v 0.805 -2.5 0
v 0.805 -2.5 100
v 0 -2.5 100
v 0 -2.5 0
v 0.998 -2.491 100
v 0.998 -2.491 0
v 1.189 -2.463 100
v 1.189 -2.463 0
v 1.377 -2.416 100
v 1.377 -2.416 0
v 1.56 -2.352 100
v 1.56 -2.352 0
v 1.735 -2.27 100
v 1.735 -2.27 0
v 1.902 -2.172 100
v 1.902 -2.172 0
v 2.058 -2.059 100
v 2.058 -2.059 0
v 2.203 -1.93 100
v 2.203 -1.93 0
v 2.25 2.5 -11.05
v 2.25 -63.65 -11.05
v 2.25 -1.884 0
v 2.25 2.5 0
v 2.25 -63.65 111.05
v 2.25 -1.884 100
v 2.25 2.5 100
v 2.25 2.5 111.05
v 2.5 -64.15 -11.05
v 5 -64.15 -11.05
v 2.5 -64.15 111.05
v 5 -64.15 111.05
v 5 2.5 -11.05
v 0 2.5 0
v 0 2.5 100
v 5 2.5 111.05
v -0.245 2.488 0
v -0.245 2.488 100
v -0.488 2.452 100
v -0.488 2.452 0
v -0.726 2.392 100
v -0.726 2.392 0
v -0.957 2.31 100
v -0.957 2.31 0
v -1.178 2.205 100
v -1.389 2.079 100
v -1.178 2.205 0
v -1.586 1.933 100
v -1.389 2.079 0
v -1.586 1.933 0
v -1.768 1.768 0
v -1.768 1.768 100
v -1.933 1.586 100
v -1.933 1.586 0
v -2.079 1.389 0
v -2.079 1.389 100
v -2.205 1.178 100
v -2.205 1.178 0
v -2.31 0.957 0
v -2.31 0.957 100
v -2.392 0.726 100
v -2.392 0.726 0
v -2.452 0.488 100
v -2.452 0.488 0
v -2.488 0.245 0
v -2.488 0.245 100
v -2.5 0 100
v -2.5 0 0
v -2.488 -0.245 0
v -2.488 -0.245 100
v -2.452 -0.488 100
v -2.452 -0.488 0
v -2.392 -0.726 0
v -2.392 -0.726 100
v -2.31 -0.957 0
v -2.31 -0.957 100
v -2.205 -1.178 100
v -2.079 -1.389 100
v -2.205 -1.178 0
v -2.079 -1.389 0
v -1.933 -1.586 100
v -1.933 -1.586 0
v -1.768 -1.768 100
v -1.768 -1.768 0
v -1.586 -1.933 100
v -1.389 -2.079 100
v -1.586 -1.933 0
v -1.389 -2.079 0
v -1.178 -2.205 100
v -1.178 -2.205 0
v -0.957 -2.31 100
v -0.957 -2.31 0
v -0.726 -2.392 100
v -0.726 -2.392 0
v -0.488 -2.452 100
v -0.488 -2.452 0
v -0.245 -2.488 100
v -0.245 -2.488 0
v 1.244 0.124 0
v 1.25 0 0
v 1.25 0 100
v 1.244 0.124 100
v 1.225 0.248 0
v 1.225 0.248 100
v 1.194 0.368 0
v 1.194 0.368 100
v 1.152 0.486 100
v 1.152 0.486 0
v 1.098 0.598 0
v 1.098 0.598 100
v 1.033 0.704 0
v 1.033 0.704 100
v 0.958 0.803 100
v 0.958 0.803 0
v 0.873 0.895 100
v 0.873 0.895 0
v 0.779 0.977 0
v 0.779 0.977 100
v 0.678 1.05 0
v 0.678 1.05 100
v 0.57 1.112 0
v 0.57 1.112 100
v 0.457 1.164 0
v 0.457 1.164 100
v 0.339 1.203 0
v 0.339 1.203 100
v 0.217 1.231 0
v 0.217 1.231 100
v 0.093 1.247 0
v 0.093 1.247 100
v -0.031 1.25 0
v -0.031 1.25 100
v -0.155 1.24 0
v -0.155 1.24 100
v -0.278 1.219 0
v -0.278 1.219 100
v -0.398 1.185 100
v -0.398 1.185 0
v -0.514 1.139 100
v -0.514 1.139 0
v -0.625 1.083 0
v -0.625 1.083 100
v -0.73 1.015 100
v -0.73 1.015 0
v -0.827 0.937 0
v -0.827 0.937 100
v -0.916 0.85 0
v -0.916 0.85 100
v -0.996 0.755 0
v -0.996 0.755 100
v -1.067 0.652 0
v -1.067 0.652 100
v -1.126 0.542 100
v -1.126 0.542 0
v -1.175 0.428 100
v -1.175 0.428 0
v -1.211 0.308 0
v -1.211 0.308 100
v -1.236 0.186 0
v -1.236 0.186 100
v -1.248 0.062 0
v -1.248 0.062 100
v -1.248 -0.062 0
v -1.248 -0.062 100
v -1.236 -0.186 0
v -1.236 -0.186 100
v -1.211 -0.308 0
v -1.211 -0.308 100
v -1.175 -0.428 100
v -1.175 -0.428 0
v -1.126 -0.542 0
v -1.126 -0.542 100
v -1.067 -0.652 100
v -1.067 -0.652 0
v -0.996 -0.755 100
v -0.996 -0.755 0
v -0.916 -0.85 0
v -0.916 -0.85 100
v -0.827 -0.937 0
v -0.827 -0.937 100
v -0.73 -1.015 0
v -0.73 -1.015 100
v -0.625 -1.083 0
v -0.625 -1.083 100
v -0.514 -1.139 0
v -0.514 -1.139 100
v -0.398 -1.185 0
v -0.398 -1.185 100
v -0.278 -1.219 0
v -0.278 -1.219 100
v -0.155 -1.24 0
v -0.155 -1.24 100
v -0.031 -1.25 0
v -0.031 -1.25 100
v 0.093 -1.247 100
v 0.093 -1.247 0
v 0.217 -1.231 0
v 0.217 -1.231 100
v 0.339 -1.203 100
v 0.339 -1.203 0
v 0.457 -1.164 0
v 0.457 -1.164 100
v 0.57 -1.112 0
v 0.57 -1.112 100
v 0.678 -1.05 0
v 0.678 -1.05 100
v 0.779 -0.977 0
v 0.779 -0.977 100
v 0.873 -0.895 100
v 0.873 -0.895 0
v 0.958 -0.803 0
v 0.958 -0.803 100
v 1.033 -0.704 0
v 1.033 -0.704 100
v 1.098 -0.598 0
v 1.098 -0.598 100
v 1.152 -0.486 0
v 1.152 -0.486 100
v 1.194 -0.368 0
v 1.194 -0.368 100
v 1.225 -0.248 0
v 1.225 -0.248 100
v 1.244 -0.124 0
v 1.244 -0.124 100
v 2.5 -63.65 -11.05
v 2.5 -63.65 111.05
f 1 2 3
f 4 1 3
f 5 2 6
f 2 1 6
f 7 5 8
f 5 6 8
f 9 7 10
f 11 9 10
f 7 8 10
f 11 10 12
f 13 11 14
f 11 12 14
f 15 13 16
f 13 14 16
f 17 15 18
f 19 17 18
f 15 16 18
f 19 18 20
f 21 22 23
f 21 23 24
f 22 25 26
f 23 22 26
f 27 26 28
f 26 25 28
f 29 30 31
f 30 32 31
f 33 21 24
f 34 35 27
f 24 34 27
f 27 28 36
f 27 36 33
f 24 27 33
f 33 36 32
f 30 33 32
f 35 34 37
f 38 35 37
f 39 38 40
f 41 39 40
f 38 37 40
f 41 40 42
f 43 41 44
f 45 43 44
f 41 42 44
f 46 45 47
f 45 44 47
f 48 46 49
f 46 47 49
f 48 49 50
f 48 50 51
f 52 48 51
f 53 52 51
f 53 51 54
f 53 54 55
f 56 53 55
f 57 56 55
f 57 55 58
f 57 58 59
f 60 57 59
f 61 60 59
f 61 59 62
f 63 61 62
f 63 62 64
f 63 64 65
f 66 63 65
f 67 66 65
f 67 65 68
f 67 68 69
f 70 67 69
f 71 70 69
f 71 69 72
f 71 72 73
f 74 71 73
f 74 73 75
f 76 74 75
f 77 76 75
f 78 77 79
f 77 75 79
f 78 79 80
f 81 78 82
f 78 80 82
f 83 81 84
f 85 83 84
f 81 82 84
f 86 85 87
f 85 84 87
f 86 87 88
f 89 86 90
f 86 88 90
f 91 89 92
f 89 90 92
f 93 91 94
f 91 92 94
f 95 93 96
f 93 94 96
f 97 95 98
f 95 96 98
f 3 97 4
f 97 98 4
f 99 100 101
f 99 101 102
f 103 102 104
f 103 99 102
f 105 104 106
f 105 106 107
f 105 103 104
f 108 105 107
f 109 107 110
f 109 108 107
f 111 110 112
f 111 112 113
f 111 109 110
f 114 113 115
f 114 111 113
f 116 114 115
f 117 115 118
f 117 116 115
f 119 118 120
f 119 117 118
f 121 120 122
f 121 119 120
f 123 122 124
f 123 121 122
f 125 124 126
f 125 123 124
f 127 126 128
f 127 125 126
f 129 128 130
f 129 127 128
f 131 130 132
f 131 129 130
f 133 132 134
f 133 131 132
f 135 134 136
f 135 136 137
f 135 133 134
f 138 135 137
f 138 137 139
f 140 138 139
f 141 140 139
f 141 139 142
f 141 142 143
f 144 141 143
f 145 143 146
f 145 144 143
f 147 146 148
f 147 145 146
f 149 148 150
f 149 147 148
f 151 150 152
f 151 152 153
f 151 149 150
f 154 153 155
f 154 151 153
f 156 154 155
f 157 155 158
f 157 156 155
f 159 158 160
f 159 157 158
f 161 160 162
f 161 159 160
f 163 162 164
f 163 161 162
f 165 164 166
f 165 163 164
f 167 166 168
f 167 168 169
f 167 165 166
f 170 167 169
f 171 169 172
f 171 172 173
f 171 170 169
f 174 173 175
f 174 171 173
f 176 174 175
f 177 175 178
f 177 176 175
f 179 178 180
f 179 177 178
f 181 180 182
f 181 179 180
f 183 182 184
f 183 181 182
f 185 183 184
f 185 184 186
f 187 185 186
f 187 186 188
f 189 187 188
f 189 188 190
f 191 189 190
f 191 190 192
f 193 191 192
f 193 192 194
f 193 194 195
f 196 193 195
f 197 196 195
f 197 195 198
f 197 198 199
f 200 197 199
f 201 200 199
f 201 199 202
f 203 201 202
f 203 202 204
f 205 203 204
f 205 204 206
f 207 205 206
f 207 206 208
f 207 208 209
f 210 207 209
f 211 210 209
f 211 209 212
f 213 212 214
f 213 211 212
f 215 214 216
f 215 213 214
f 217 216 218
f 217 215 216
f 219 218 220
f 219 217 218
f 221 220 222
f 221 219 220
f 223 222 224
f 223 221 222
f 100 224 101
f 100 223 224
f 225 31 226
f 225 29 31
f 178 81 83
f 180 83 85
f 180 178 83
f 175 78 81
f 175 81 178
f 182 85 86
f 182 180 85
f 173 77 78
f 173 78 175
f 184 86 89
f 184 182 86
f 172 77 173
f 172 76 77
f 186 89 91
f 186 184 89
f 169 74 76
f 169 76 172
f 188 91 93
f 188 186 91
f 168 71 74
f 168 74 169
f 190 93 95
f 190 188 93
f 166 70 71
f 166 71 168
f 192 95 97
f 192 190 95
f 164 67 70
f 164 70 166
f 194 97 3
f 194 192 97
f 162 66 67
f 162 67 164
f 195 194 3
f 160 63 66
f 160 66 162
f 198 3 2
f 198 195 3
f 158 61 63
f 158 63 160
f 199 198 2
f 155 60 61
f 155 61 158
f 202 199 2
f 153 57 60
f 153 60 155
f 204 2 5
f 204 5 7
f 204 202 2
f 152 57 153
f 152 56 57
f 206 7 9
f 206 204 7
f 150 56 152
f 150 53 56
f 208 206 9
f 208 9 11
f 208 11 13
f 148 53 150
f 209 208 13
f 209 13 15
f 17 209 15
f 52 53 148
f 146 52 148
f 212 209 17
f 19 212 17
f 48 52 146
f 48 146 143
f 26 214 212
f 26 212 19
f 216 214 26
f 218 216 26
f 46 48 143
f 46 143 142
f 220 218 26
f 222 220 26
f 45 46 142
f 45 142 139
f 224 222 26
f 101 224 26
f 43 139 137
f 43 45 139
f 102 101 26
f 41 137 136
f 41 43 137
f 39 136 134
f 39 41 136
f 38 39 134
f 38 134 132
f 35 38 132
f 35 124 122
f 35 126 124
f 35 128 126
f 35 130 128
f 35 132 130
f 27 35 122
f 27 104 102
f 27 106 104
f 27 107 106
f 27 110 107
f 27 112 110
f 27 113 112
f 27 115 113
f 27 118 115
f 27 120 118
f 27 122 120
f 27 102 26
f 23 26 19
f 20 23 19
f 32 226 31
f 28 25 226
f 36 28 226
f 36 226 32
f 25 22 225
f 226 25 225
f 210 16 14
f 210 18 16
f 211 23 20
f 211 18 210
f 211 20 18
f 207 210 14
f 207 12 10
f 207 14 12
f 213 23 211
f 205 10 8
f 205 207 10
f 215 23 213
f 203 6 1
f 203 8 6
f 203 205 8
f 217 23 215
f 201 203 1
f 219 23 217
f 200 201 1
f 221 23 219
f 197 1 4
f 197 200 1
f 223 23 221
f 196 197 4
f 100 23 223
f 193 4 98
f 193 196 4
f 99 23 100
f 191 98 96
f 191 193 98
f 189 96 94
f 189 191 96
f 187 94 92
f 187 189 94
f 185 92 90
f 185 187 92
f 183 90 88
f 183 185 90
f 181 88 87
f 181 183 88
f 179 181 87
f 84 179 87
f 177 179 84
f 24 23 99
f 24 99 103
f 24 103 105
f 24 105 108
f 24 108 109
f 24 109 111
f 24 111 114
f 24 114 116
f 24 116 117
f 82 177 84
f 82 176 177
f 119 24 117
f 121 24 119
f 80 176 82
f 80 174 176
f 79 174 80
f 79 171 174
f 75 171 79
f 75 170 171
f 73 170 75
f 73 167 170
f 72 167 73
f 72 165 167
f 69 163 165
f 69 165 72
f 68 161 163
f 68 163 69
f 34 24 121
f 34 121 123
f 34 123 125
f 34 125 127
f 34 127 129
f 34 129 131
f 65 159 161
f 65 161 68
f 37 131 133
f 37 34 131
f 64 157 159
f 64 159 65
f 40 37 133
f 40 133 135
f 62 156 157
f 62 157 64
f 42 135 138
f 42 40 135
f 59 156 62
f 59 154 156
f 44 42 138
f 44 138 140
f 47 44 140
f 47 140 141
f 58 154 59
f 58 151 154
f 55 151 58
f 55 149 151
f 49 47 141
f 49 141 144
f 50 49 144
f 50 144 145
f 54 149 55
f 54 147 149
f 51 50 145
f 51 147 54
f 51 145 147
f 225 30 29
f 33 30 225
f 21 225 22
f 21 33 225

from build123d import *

# Parameters (mm, degrees)
SCHIZZO4_R                   = 2.5
SCHIZZO4_R_2                 = 1.25
ESTRUSIONE_ESTRUSIONE3_DEPTH = 100
ESTRUSIONE_ESTRUSIONE4_DEPTH = 61.05
SCHIZZO6_W                   = 8.237008172
SCHIZZO6_H                   = 5.970383375
TAGLIO_ESTRUSIONE2_DEPTH     = 119.1
SCHIZZO7_W                   = 6.014694103
SCHIZZO7_H                   = 5.674261039
TAGLIO_ESTRUSIONE3_DEPTH     = 119.1
ESTRUSIONE_ESTRUSIONE5_REACH = 140.017
SCHIZZO8_W                   = 2.75
SCHIZZO8_H                   = 66.15
TAGLIO_ESTRUSIONE4_DEPTH     = 300
RACCORDO1_R                  = 2


with BuildPart() as part:
    # Schizzo4 → Estrusione-Estrusione3 (new body)
    with BuildSketch(Plane.XY):
        Circle(SCHIZZO4_R)
        Circle(SCHIZZO4_R_2, mode=Mode.SUBTRACT)
    extrude(amount=ESTRUSIONE_ESTRUSIONE3_DEPTH)

    # Schizzo5 → Estrusione-Estrusione4 (add, symmetric)
    with BuildSketch(Plane.XY.offset(50)):
        with BuildLine():
            Line((0, 2.5), (5, 2.5))
            Line((5, 2.5), (5, -64.15))
            Line((5, -64.15), (2.5, -64.15))
            Line((2.5, -64.15), (2.5, -2.5))
            Line((2.5, -2.5), (0, -2.5))
            ThreePointArc((0, -2.5), (2.5, 0), (0, 2.5))
        make_face()
    extrude(amount=ESTRUSIONE_ESTRUSIONE4_DEPTH, both=True)

    # Schizzo6 → Taglio-Estrusione2 (cut)
    with BuildSketch(Plane(origin=(0, 0, 0), x_dir=(-1, 0, 0), z_dir=(0, 0, -1))):
        with Locations((1.618504086, 0.485191688)):
            Rectangle(SCHIZZO6_W, SCHIZZO6_H)
    extrude(amount=TAGLIO_ESTRUSIONE2_DEPTH, mode=Mode.SUBTRACT)

    # Schizzo7 → Taglio-Estrusione3 (cut)
    with BuildSketch(Plane.XY.offset(100)):
        with Locations((-0.507347052, 0.33713052)):
            Rectangle(SCHIZZO7_W, SCHIZZO7_H)
    extrude(amount=TAGLIO_ESTRUSIONE3_DEPTH, mode=Mode.SUBTRACT)

    # Estrusione-Estrusione5: up to this face of the body (flat: up to its plane)
    estrusione_estrusione5_end = Plane(part.part.faces().sort_by_distance((3.75, -30.825, -11.05))[0])
    # Schizzo8 → Estrusione-Estrusione5 (add, up to the picked face)
    with BuildSketch(Plane.XY.offset(111.05), mode=Mode.PRIVATE) as estrusione_estrusione5_sk1:
        with Locations((3.625, -30.575)):
            Rectangle(SCHIZZO8_W, SCHIZZO8_H)
    estrusione_estrusione5_tool1 = split(extrude(estrusione_estrusione5_sk1.sketch, amount=-ESTRUSIONE_ESTRUSIONE5_REACH, mode=Mode.PRIVATE), bisect_by=estrusione_estrusione5_end, keep=Keep.BOTH, mode=Mode.PRIVATE)
    add(estrusione_estrusione5_tool1.solids().sort_by(Axis((3.625, -30.575, 111.05), (0, 0, -1)))[0])

    # Schizzo9 → Taglio-Estrusione4 (cut)
    with BuildSketch(Plane.XY.offset(100)):
        Polygon((2.25, -2.5), (2.25, -1.883948392), (1.619804847, -2.5), align=None)
    extrude(amount=-TAGLIO_ESTRUSIONE4_DEPTH, mode=Mode.SUBTRACT)

    # Raccordo1
    raccordo1_edges = [part.edges().sort_by_distance(p)[0] for p in [
        (1.619804847, -2.5, 50),
    ]]
    fillet(raccordo1_edges, radius=RACCORDO1_R)


solid = part.part
